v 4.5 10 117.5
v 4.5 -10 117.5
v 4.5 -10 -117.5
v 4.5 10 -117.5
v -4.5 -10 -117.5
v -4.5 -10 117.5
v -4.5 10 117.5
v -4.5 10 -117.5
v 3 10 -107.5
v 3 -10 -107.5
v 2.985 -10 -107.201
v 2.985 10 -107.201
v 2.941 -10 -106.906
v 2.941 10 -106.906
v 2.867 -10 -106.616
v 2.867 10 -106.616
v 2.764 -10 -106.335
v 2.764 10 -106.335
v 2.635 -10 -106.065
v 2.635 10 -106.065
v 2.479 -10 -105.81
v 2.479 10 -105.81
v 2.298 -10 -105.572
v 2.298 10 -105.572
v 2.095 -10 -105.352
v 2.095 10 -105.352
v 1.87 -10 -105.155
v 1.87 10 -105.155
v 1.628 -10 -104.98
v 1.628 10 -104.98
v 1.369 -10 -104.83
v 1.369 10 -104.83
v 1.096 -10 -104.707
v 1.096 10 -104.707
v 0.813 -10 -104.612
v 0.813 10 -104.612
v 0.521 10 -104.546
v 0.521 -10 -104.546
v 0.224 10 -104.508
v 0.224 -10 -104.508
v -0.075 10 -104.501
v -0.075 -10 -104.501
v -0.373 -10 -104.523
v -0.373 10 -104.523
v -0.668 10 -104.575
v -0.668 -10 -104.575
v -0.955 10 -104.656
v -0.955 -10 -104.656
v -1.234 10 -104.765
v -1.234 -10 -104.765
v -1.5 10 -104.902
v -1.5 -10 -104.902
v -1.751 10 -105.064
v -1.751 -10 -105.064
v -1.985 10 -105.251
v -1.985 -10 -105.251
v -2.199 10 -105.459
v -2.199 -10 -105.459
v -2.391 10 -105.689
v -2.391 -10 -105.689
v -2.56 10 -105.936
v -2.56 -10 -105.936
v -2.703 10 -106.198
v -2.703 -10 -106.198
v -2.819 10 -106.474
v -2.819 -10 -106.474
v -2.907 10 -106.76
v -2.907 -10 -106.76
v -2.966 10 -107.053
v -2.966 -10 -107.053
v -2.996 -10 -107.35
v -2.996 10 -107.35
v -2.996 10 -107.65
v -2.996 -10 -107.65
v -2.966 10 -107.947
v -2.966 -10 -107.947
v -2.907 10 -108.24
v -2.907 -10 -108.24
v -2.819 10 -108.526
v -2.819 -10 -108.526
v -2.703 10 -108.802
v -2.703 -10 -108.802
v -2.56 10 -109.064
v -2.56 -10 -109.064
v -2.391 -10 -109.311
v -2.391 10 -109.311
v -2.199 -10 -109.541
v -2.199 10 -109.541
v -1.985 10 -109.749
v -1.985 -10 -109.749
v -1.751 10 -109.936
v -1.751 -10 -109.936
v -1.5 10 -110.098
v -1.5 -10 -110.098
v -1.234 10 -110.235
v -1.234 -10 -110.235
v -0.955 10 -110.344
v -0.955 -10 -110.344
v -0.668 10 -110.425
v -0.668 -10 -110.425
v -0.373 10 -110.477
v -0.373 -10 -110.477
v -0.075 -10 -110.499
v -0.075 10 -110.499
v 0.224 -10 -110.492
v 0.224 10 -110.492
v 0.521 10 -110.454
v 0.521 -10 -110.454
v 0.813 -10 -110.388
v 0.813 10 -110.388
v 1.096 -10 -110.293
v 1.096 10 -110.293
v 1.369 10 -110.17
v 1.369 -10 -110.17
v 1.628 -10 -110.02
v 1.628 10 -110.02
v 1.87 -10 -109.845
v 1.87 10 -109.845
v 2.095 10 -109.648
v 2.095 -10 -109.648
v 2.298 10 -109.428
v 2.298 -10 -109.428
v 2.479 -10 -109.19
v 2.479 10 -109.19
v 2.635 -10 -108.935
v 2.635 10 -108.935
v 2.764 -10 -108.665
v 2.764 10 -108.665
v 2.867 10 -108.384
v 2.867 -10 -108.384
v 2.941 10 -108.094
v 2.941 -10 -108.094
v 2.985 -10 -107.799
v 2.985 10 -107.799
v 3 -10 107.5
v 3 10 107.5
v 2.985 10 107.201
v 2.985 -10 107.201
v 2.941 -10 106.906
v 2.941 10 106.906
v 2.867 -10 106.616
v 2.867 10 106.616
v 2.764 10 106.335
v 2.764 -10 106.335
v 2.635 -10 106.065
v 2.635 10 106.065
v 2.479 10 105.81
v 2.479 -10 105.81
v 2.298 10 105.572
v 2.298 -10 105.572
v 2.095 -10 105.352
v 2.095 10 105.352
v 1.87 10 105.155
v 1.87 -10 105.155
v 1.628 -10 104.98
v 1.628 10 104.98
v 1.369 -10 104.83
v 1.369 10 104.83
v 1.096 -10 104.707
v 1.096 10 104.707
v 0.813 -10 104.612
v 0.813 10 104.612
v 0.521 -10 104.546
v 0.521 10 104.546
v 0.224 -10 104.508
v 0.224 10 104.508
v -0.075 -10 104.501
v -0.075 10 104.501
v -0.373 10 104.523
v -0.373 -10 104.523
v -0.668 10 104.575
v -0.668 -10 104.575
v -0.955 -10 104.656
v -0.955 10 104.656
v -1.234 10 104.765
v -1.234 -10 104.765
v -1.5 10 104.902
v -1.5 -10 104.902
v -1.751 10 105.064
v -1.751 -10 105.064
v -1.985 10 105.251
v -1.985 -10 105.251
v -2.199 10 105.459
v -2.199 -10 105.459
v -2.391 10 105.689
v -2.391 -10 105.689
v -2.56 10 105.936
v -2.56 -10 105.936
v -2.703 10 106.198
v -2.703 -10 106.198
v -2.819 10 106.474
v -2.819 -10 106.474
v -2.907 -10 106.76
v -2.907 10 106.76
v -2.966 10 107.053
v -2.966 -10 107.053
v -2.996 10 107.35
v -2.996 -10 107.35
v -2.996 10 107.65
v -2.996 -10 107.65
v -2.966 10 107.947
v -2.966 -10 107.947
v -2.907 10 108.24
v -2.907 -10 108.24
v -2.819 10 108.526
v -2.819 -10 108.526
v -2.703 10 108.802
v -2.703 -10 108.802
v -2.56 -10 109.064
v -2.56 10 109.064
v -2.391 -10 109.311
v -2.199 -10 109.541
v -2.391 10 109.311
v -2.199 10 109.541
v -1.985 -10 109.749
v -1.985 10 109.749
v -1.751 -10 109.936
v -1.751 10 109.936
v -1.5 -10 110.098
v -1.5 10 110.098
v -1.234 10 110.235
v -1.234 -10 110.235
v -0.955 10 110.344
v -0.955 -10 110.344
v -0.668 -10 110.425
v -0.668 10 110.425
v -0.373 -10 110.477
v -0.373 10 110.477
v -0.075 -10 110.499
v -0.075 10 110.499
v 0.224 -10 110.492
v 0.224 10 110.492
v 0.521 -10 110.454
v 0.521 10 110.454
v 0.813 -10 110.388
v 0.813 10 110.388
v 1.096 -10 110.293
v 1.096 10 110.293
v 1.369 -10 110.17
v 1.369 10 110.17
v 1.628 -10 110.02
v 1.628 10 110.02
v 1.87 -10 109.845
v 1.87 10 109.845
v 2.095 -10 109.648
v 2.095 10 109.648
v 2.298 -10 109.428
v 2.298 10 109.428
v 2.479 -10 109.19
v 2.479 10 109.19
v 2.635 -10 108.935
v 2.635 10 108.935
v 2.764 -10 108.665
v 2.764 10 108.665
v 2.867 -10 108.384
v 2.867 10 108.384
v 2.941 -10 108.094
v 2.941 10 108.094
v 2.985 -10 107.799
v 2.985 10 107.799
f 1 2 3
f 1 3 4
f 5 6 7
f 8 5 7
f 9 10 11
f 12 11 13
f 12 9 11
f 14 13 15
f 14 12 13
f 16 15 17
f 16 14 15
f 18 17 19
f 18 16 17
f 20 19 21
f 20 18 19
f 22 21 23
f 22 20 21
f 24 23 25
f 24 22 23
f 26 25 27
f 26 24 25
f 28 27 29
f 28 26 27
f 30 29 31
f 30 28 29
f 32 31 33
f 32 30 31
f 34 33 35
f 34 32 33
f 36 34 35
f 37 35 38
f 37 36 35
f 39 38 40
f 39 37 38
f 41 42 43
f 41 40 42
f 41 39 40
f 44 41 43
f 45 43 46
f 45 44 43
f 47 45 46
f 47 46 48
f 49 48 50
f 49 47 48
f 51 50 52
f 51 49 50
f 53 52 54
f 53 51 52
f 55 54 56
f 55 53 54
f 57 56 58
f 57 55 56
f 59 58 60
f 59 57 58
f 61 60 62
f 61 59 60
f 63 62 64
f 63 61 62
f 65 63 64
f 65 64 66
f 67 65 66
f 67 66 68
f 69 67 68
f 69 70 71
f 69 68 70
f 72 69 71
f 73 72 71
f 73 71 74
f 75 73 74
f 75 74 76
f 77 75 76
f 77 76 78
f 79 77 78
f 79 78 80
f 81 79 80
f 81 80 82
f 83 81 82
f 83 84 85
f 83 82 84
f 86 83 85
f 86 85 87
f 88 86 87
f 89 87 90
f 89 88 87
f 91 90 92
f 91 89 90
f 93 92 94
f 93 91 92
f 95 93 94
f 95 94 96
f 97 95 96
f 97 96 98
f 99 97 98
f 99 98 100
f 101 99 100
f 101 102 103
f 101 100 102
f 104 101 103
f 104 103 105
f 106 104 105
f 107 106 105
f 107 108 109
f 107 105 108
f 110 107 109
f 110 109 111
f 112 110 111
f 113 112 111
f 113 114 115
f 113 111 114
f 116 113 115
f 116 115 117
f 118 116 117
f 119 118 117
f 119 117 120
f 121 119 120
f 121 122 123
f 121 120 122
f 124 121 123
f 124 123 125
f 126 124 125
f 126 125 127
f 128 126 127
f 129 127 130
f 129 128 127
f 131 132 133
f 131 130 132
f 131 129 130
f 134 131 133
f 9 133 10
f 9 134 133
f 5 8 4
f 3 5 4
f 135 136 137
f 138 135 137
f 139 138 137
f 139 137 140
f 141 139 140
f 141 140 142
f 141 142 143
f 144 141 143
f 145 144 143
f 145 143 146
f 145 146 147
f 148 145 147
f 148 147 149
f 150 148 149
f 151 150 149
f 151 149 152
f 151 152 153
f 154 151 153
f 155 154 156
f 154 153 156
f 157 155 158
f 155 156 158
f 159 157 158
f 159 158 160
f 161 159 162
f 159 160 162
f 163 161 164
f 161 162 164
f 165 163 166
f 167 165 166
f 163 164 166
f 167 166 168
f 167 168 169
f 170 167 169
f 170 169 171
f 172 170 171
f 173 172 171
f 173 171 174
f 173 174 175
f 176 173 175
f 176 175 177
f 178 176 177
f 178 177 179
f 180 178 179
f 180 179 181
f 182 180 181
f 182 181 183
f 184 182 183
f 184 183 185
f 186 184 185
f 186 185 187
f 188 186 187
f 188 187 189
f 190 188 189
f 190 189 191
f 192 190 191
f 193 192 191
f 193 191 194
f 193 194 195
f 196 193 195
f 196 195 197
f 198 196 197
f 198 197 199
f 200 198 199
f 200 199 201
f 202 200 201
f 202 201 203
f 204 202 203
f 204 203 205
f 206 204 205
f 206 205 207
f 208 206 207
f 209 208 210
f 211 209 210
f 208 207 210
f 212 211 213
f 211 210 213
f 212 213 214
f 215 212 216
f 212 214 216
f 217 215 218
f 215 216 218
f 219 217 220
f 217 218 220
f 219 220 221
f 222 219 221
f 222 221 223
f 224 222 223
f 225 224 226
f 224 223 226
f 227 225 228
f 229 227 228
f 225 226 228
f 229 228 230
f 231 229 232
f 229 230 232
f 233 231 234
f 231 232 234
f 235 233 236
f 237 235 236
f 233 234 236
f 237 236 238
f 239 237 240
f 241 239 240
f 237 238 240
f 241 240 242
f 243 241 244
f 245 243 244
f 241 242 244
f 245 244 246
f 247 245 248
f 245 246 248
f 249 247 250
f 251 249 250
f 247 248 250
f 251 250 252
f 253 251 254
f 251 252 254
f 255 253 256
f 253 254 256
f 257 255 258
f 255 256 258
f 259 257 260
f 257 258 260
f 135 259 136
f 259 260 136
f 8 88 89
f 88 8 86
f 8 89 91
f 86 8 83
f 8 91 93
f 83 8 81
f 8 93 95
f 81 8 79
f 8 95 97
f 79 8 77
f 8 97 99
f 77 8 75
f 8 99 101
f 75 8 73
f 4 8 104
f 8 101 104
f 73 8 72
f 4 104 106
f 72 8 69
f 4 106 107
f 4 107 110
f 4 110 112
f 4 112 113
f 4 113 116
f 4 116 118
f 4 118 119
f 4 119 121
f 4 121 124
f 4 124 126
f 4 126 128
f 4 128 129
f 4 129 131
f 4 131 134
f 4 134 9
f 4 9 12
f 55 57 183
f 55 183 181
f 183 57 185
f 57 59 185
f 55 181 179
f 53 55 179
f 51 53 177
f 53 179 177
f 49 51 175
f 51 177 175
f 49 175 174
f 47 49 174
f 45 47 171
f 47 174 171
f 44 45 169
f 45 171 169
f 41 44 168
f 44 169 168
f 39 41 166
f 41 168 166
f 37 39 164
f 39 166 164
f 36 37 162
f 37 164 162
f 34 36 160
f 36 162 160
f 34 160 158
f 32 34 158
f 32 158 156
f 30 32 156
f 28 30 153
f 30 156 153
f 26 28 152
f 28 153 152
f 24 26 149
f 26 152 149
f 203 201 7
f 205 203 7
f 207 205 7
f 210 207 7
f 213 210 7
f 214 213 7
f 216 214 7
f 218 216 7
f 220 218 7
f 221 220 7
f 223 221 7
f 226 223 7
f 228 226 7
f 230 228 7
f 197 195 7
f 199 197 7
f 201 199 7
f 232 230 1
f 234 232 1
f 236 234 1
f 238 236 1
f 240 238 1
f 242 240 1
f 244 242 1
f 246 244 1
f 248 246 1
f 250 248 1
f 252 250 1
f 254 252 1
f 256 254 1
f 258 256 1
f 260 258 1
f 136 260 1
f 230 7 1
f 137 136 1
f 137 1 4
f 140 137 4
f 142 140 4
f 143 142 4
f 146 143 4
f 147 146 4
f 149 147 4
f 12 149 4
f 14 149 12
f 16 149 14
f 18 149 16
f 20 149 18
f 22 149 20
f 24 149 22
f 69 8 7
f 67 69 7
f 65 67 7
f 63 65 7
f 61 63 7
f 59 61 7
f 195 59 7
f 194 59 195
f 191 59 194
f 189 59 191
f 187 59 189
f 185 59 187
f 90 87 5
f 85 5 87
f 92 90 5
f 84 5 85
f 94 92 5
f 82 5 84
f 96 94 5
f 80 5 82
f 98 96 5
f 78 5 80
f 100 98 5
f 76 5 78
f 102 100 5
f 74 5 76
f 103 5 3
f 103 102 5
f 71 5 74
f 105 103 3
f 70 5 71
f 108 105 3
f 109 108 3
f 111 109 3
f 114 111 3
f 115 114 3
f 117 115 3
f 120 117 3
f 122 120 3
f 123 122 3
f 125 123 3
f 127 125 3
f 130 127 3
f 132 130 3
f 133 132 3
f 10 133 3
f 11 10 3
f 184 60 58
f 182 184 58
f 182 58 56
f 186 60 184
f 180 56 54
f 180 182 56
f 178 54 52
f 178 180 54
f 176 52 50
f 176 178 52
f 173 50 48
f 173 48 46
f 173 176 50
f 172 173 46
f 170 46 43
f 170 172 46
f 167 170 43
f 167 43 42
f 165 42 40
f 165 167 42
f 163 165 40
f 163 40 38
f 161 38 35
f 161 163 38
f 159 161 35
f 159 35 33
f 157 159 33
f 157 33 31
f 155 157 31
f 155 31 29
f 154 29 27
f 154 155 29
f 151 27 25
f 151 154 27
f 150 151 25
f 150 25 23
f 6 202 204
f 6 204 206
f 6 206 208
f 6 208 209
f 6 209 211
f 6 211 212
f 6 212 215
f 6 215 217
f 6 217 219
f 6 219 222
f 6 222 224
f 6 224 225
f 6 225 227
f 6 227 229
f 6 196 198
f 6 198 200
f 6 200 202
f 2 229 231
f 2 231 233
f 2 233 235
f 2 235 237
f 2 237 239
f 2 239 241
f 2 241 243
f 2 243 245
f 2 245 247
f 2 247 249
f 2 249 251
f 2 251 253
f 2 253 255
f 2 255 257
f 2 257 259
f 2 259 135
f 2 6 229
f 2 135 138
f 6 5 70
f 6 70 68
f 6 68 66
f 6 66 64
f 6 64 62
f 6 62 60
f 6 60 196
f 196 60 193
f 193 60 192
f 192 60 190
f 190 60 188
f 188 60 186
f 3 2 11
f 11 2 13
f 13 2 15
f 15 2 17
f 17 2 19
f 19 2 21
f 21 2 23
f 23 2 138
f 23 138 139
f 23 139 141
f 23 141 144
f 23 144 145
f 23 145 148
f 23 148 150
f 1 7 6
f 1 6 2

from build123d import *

# Parameters (mm, degrees)
SKETCH1_W           = 9
SKETCH1_H           = 20
BOSS_EXTRUDE1_DEPTH = 117.5
SKETCH3_R           = 3
CUT_EXTRUDE2_DEPTH  = 21


with BuildPart() as part:
    # Sketch1 → Boss-Extrude1 (new body, symmetric)
    with BuildSketch(Plane.XY):
        Rectangle(SKETCH1_W, SKETCH1_H)
    extrude(amount=BOSS_EXTRUDE1_DEPTH, both=True)

    # Sketch3 → Cut-Extrude2 (cut, through all)
    with BuildSketch(Plane(origin=(0, 10, 0), x_dir=(1, 0, 0), z_dir=(0, 1, 0))):
        with Locations((0, -107.5)):
            Circle(SKETCH3_R)
    cut_extrude2 = extrude(amount=-CUT_EXTRUDE2_DEPTH, mode=Mode.SUBTRACT)

    # Mirror2: Cut-Extrude2 across plane
    add(cut_extrude2.mirror(Plane.XY), mode=Mode.SUBTRACT)


solid = part.part
